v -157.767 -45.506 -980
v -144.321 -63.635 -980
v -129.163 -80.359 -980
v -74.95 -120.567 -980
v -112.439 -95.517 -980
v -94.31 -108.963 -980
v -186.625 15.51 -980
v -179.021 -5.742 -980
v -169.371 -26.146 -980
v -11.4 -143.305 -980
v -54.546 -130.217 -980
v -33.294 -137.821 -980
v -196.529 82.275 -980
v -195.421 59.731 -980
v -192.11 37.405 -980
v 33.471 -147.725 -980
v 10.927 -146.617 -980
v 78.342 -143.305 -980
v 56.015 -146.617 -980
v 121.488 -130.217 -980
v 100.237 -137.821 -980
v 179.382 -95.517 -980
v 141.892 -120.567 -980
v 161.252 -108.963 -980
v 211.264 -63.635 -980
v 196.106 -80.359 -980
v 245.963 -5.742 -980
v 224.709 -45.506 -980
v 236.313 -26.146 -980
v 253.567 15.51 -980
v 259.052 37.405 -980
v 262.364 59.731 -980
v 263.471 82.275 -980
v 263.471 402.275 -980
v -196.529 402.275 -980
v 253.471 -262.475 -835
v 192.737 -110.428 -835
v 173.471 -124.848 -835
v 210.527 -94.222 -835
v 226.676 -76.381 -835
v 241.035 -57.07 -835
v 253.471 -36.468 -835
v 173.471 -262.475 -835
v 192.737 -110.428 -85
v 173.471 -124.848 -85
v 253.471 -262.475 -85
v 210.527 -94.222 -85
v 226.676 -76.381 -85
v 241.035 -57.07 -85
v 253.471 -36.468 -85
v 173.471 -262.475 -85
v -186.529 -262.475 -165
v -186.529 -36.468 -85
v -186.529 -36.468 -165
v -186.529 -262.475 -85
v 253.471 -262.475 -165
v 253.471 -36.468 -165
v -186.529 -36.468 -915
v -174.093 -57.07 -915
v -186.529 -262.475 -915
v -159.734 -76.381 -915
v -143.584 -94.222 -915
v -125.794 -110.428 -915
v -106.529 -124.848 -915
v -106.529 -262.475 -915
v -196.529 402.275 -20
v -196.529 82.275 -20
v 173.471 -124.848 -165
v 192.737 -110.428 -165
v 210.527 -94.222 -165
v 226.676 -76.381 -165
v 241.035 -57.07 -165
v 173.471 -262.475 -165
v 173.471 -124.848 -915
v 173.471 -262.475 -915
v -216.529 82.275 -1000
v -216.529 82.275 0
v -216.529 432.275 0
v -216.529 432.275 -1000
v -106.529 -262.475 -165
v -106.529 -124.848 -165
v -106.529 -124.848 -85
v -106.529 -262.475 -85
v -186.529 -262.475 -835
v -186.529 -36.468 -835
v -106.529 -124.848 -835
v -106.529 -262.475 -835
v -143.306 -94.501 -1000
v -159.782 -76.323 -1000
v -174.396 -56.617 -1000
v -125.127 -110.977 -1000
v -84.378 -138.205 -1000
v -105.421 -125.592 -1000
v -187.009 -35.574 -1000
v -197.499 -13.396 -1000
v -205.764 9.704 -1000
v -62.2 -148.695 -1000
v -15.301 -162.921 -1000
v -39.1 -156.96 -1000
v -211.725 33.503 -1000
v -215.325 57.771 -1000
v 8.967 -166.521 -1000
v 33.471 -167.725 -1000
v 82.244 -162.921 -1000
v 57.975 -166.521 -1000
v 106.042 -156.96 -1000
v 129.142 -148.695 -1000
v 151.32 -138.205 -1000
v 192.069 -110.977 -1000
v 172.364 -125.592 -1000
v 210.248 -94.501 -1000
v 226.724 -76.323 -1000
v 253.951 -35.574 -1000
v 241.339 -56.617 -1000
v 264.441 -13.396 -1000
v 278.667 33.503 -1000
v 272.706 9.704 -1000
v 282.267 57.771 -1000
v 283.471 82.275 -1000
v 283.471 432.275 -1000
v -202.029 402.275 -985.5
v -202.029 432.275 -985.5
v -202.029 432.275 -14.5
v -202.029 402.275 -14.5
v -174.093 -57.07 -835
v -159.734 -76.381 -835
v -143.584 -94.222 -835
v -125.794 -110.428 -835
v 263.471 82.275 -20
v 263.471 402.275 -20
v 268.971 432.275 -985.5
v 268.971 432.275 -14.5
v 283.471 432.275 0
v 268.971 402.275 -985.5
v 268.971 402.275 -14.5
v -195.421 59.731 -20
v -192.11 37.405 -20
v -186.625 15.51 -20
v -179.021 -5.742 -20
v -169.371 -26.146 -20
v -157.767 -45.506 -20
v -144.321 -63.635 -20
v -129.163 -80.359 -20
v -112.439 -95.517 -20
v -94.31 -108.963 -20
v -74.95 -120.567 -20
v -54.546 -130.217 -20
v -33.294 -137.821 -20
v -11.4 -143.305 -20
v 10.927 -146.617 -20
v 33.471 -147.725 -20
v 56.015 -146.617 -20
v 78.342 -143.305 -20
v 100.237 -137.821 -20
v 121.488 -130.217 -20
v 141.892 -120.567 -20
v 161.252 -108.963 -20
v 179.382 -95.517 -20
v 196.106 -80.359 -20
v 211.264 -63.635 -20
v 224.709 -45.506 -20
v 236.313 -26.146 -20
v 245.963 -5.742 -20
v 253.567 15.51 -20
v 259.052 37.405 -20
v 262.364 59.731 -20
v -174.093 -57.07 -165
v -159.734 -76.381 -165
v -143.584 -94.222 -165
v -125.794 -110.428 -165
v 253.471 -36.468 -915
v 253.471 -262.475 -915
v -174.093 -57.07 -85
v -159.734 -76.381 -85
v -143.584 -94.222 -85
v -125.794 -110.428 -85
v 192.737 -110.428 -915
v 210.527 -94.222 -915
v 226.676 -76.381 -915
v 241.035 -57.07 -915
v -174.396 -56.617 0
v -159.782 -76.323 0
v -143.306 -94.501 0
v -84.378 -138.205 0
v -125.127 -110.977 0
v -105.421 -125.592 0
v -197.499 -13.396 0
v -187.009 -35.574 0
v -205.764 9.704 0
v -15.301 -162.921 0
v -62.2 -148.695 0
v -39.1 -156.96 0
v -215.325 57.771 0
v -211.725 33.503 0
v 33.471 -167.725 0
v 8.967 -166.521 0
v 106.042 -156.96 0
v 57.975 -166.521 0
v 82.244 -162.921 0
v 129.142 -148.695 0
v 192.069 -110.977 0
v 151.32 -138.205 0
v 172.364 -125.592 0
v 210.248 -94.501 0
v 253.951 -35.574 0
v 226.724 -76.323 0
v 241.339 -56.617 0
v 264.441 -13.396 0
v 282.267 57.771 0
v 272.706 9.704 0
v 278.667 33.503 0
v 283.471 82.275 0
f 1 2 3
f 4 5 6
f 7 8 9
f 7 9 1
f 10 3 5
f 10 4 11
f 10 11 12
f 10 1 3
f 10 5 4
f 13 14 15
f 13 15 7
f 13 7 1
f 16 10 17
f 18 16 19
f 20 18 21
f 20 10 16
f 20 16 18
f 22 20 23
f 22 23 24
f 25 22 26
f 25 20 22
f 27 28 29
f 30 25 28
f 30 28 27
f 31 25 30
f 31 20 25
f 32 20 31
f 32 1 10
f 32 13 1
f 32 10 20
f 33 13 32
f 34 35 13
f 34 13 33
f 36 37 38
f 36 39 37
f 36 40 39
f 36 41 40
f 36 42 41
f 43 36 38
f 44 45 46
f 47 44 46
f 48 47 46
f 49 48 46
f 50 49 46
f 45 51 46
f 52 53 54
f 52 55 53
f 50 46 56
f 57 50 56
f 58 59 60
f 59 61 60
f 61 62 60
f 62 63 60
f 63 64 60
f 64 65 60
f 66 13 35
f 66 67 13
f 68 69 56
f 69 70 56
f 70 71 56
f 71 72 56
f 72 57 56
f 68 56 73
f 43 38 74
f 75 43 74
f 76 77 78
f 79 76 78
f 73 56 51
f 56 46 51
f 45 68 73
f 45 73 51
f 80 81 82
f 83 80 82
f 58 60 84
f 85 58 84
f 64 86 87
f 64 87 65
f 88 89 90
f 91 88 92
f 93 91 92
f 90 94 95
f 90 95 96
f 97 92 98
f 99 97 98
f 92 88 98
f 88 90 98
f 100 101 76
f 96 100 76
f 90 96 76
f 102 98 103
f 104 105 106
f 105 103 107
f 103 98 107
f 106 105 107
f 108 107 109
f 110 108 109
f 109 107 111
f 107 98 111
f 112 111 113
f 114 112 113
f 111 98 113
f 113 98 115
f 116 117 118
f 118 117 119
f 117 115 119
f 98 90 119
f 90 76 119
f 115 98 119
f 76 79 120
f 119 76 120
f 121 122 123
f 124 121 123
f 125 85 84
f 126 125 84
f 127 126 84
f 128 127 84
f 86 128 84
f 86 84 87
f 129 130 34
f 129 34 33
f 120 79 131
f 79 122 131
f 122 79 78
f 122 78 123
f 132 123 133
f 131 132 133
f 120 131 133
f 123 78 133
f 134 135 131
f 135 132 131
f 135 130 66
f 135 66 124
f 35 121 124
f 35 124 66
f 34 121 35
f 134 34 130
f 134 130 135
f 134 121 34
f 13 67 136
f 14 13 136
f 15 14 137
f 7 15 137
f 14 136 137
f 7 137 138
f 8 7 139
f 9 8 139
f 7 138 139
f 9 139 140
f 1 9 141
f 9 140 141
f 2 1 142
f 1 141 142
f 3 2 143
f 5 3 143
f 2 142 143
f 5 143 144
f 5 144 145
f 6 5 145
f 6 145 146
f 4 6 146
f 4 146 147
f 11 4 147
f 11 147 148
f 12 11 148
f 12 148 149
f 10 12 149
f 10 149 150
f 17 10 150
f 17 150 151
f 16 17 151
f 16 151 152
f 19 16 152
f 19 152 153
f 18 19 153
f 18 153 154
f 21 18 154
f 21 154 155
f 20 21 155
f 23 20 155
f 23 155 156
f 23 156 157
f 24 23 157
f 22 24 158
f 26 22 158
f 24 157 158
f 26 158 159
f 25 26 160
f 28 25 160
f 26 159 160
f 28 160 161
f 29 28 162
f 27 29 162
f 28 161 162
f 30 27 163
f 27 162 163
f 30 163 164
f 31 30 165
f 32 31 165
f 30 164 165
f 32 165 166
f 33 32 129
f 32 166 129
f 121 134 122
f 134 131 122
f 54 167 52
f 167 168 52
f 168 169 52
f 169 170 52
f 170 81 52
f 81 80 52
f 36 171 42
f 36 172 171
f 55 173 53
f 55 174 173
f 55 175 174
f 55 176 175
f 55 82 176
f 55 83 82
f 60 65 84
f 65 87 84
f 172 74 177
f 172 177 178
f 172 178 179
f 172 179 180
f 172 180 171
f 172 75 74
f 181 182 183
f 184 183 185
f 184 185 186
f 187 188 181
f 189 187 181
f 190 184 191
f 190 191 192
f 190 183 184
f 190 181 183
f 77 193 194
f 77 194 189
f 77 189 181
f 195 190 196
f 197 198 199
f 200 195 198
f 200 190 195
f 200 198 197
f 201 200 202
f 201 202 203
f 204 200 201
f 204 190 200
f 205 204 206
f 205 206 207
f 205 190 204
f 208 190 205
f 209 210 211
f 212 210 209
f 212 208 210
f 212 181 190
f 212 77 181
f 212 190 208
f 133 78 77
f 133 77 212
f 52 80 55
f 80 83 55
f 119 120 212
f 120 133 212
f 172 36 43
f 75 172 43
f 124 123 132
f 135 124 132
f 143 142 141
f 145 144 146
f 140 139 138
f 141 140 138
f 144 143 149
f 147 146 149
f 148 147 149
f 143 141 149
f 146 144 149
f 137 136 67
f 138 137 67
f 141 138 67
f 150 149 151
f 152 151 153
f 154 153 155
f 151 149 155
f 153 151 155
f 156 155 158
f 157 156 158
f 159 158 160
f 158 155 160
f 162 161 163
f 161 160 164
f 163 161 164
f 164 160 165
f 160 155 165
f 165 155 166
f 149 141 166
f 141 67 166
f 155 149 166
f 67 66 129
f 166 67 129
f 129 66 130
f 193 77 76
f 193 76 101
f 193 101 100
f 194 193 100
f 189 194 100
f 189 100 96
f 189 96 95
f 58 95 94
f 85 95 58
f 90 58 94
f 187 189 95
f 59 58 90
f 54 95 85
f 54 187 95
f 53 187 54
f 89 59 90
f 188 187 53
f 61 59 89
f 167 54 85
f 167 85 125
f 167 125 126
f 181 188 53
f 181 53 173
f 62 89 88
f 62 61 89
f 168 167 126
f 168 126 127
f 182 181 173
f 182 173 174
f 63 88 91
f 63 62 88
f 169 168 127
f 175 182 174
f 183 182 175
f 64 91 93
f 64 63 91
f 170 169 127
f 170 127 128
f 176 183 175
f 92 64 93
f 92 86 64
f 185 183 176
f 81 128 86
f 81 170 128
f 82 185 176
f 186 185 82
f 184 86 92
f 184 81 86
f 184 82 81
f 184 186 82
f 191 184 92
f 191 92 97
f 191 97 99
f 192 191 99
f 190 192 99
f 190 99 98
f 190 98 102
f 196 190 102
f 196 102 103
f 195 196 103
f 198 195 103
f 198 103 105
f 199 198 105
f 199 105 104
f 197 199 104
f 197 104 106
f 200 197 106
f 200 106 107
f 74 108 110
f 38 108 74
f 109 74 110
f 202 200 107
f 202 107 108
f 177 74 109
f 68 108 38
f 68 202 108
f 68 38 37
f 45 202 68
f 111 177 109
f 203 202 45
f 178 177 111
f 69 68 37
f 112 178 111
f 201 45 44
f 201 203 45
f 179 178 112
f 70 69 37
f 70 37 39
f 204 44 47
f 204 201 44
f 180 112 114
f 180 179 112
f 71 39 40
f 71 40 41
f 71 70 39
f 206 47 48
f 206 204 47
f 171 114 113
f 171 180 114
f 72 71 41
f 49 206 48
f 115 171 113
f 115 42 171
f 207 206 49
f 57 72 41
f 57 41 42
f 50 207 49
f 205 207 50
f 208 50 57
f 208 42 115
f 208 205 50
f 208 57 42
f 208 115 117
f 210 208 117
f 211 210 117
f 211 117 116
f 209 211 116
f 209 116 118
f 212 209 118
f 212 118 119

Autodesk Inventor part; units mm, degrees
ref_plane "YZ Plane" through (0, 0, 0) normal (1, 0, 0) x (0, 1, 0)
ref_plane "XZ Plane" through (0, 0, 0) normal (0, 1, 0) x (-1, 0, 0)
ref_plane "XY Plane" through (0, 0, 0) normal (0, 0, 1) x (1, 0, 0)
sketch "Sketch1" plane through (0, 0, 0) normal (0, 0, 1) x (1, 0, 0)
  line L0 (-216.5289, 82.2753) -> (-216.5289, 432.2753)
  line L1 (-216.5289, 432.2753) -> (283.4711, 432.2753)
  line L2 (283.4711, 432.2753) -> (283.4711, 82.2753)
  arc A0 (-216.5289, 82.2753) -> (283.4711, 82.2753) centre (33.4711, 82.2753) ccw
  point P0 (0, 0)
  dimension "d0" = 500
  dimension "d1" = 250
  dimension "d2" = 350
extrude "Extrusion1" add sketch "Sketch1" against normal blind 1000
shell "Shell1" thickness 20 removed faces 1 at (-49.8623, 432.2753, -333.3333)
ref_plane "Work Plane1" through (-216.5289, -262.4747, 0) normal (0, 1, 0) x (-1, 0, 0)
sketch "Sketch2" plane through (-216.5289, -262.4747, 0) normal (0, 1, 0) x (-1, 0, 0)
  point P0 (-216.5289, 0)
sketch "Sketch3" plane through (-216.5289, -262.4747, 0) normal (0, 1, 0) x (-1, 0, 0)
  line L0 (-110, -915) -> (-30, -915)
  line L1 (-30, -915) -> (-30, -835)
  line L2 (-30, -835) -> (-110, -835)
  line L3 (-110, -835) -> (-110, -915)
  line L4 (-390, -915) -> (-470, -915)
  line L5 (-470, -915) -> (-470, -835)
  line L6 (-470, -835) -> (-390, -835)
  line L7 (-390, -835) -> (-390, -915)
  line L8 (-500, 0) -> (-500, -1000) projected
  line L9 (0, 0) -> (0, -1000) projected
  line L10 (-500, -1000) -> (0, -1000) projected
  line L11 (0, 0) -> (0, -1000) projected
  line L12 (0, -500) -> (-564.0368, -500)
  line L13 (-110, -85) -> (-30, -85)
  line L14 (-30, -85) -> (-30, -165)
  line L15 (-110, -165) -> (-110, -85)
  line L16 (-390, -85) -> (-470, -85)
  line L17 (-470, -85) -> (-470, -165)
  line L18 (-470, -165) -> (-390, -165)
  line L19 (-390, -165) -> (-390, -85)
  line L20 (-110, -165) -> (-30, -165)
  point P0 (-216.5289, 0)
  dimension "d6" = 80
  dimension "d7" = 80
  dimension "d8" = 30
  dimension "d10" = 30
  dimension "d11" = 85
extrude "Extrusion2" add sketch "Sketch3" along normal up to next contours L3 L2 L1 L0 | L4 L5 L6 L7 | L13 L14 L20 L15 | L19 L18 L17 L16
sketch "Sketch4" plane through (-216.5289, 432.2753, 0) normal (0, 1, 0) x (1, 0, 0)
  line L0 (14.5, 14.5) -> (485.5, 14.5)
  line L1 (485.5, 14.5) -> (485.5, 985.5)
  line L2 (485.5, 985.5) -> (14.5, 985.5)
  line L3 (14.5, 985.5) -> (14.5, 14.5)
  line L4 (480, 980) -> (480, 20) projected
  line L5 (480, 20) -> (20, 20) projected
  line L6 (20, 20) -> (20, 980) projected
  line L7 (20, 980) -> (480, 980) projected
  point P0 (216.5289, 0)
  dimension "d14" = 5.5
  dimension "d15" = 5.5
  dimension "d16" = 5.5
  dimension "d17" = 5.5
extrude "Extrusion3" cut sketch "Sketch4" against normal blind 30
properties part number "Composter"
